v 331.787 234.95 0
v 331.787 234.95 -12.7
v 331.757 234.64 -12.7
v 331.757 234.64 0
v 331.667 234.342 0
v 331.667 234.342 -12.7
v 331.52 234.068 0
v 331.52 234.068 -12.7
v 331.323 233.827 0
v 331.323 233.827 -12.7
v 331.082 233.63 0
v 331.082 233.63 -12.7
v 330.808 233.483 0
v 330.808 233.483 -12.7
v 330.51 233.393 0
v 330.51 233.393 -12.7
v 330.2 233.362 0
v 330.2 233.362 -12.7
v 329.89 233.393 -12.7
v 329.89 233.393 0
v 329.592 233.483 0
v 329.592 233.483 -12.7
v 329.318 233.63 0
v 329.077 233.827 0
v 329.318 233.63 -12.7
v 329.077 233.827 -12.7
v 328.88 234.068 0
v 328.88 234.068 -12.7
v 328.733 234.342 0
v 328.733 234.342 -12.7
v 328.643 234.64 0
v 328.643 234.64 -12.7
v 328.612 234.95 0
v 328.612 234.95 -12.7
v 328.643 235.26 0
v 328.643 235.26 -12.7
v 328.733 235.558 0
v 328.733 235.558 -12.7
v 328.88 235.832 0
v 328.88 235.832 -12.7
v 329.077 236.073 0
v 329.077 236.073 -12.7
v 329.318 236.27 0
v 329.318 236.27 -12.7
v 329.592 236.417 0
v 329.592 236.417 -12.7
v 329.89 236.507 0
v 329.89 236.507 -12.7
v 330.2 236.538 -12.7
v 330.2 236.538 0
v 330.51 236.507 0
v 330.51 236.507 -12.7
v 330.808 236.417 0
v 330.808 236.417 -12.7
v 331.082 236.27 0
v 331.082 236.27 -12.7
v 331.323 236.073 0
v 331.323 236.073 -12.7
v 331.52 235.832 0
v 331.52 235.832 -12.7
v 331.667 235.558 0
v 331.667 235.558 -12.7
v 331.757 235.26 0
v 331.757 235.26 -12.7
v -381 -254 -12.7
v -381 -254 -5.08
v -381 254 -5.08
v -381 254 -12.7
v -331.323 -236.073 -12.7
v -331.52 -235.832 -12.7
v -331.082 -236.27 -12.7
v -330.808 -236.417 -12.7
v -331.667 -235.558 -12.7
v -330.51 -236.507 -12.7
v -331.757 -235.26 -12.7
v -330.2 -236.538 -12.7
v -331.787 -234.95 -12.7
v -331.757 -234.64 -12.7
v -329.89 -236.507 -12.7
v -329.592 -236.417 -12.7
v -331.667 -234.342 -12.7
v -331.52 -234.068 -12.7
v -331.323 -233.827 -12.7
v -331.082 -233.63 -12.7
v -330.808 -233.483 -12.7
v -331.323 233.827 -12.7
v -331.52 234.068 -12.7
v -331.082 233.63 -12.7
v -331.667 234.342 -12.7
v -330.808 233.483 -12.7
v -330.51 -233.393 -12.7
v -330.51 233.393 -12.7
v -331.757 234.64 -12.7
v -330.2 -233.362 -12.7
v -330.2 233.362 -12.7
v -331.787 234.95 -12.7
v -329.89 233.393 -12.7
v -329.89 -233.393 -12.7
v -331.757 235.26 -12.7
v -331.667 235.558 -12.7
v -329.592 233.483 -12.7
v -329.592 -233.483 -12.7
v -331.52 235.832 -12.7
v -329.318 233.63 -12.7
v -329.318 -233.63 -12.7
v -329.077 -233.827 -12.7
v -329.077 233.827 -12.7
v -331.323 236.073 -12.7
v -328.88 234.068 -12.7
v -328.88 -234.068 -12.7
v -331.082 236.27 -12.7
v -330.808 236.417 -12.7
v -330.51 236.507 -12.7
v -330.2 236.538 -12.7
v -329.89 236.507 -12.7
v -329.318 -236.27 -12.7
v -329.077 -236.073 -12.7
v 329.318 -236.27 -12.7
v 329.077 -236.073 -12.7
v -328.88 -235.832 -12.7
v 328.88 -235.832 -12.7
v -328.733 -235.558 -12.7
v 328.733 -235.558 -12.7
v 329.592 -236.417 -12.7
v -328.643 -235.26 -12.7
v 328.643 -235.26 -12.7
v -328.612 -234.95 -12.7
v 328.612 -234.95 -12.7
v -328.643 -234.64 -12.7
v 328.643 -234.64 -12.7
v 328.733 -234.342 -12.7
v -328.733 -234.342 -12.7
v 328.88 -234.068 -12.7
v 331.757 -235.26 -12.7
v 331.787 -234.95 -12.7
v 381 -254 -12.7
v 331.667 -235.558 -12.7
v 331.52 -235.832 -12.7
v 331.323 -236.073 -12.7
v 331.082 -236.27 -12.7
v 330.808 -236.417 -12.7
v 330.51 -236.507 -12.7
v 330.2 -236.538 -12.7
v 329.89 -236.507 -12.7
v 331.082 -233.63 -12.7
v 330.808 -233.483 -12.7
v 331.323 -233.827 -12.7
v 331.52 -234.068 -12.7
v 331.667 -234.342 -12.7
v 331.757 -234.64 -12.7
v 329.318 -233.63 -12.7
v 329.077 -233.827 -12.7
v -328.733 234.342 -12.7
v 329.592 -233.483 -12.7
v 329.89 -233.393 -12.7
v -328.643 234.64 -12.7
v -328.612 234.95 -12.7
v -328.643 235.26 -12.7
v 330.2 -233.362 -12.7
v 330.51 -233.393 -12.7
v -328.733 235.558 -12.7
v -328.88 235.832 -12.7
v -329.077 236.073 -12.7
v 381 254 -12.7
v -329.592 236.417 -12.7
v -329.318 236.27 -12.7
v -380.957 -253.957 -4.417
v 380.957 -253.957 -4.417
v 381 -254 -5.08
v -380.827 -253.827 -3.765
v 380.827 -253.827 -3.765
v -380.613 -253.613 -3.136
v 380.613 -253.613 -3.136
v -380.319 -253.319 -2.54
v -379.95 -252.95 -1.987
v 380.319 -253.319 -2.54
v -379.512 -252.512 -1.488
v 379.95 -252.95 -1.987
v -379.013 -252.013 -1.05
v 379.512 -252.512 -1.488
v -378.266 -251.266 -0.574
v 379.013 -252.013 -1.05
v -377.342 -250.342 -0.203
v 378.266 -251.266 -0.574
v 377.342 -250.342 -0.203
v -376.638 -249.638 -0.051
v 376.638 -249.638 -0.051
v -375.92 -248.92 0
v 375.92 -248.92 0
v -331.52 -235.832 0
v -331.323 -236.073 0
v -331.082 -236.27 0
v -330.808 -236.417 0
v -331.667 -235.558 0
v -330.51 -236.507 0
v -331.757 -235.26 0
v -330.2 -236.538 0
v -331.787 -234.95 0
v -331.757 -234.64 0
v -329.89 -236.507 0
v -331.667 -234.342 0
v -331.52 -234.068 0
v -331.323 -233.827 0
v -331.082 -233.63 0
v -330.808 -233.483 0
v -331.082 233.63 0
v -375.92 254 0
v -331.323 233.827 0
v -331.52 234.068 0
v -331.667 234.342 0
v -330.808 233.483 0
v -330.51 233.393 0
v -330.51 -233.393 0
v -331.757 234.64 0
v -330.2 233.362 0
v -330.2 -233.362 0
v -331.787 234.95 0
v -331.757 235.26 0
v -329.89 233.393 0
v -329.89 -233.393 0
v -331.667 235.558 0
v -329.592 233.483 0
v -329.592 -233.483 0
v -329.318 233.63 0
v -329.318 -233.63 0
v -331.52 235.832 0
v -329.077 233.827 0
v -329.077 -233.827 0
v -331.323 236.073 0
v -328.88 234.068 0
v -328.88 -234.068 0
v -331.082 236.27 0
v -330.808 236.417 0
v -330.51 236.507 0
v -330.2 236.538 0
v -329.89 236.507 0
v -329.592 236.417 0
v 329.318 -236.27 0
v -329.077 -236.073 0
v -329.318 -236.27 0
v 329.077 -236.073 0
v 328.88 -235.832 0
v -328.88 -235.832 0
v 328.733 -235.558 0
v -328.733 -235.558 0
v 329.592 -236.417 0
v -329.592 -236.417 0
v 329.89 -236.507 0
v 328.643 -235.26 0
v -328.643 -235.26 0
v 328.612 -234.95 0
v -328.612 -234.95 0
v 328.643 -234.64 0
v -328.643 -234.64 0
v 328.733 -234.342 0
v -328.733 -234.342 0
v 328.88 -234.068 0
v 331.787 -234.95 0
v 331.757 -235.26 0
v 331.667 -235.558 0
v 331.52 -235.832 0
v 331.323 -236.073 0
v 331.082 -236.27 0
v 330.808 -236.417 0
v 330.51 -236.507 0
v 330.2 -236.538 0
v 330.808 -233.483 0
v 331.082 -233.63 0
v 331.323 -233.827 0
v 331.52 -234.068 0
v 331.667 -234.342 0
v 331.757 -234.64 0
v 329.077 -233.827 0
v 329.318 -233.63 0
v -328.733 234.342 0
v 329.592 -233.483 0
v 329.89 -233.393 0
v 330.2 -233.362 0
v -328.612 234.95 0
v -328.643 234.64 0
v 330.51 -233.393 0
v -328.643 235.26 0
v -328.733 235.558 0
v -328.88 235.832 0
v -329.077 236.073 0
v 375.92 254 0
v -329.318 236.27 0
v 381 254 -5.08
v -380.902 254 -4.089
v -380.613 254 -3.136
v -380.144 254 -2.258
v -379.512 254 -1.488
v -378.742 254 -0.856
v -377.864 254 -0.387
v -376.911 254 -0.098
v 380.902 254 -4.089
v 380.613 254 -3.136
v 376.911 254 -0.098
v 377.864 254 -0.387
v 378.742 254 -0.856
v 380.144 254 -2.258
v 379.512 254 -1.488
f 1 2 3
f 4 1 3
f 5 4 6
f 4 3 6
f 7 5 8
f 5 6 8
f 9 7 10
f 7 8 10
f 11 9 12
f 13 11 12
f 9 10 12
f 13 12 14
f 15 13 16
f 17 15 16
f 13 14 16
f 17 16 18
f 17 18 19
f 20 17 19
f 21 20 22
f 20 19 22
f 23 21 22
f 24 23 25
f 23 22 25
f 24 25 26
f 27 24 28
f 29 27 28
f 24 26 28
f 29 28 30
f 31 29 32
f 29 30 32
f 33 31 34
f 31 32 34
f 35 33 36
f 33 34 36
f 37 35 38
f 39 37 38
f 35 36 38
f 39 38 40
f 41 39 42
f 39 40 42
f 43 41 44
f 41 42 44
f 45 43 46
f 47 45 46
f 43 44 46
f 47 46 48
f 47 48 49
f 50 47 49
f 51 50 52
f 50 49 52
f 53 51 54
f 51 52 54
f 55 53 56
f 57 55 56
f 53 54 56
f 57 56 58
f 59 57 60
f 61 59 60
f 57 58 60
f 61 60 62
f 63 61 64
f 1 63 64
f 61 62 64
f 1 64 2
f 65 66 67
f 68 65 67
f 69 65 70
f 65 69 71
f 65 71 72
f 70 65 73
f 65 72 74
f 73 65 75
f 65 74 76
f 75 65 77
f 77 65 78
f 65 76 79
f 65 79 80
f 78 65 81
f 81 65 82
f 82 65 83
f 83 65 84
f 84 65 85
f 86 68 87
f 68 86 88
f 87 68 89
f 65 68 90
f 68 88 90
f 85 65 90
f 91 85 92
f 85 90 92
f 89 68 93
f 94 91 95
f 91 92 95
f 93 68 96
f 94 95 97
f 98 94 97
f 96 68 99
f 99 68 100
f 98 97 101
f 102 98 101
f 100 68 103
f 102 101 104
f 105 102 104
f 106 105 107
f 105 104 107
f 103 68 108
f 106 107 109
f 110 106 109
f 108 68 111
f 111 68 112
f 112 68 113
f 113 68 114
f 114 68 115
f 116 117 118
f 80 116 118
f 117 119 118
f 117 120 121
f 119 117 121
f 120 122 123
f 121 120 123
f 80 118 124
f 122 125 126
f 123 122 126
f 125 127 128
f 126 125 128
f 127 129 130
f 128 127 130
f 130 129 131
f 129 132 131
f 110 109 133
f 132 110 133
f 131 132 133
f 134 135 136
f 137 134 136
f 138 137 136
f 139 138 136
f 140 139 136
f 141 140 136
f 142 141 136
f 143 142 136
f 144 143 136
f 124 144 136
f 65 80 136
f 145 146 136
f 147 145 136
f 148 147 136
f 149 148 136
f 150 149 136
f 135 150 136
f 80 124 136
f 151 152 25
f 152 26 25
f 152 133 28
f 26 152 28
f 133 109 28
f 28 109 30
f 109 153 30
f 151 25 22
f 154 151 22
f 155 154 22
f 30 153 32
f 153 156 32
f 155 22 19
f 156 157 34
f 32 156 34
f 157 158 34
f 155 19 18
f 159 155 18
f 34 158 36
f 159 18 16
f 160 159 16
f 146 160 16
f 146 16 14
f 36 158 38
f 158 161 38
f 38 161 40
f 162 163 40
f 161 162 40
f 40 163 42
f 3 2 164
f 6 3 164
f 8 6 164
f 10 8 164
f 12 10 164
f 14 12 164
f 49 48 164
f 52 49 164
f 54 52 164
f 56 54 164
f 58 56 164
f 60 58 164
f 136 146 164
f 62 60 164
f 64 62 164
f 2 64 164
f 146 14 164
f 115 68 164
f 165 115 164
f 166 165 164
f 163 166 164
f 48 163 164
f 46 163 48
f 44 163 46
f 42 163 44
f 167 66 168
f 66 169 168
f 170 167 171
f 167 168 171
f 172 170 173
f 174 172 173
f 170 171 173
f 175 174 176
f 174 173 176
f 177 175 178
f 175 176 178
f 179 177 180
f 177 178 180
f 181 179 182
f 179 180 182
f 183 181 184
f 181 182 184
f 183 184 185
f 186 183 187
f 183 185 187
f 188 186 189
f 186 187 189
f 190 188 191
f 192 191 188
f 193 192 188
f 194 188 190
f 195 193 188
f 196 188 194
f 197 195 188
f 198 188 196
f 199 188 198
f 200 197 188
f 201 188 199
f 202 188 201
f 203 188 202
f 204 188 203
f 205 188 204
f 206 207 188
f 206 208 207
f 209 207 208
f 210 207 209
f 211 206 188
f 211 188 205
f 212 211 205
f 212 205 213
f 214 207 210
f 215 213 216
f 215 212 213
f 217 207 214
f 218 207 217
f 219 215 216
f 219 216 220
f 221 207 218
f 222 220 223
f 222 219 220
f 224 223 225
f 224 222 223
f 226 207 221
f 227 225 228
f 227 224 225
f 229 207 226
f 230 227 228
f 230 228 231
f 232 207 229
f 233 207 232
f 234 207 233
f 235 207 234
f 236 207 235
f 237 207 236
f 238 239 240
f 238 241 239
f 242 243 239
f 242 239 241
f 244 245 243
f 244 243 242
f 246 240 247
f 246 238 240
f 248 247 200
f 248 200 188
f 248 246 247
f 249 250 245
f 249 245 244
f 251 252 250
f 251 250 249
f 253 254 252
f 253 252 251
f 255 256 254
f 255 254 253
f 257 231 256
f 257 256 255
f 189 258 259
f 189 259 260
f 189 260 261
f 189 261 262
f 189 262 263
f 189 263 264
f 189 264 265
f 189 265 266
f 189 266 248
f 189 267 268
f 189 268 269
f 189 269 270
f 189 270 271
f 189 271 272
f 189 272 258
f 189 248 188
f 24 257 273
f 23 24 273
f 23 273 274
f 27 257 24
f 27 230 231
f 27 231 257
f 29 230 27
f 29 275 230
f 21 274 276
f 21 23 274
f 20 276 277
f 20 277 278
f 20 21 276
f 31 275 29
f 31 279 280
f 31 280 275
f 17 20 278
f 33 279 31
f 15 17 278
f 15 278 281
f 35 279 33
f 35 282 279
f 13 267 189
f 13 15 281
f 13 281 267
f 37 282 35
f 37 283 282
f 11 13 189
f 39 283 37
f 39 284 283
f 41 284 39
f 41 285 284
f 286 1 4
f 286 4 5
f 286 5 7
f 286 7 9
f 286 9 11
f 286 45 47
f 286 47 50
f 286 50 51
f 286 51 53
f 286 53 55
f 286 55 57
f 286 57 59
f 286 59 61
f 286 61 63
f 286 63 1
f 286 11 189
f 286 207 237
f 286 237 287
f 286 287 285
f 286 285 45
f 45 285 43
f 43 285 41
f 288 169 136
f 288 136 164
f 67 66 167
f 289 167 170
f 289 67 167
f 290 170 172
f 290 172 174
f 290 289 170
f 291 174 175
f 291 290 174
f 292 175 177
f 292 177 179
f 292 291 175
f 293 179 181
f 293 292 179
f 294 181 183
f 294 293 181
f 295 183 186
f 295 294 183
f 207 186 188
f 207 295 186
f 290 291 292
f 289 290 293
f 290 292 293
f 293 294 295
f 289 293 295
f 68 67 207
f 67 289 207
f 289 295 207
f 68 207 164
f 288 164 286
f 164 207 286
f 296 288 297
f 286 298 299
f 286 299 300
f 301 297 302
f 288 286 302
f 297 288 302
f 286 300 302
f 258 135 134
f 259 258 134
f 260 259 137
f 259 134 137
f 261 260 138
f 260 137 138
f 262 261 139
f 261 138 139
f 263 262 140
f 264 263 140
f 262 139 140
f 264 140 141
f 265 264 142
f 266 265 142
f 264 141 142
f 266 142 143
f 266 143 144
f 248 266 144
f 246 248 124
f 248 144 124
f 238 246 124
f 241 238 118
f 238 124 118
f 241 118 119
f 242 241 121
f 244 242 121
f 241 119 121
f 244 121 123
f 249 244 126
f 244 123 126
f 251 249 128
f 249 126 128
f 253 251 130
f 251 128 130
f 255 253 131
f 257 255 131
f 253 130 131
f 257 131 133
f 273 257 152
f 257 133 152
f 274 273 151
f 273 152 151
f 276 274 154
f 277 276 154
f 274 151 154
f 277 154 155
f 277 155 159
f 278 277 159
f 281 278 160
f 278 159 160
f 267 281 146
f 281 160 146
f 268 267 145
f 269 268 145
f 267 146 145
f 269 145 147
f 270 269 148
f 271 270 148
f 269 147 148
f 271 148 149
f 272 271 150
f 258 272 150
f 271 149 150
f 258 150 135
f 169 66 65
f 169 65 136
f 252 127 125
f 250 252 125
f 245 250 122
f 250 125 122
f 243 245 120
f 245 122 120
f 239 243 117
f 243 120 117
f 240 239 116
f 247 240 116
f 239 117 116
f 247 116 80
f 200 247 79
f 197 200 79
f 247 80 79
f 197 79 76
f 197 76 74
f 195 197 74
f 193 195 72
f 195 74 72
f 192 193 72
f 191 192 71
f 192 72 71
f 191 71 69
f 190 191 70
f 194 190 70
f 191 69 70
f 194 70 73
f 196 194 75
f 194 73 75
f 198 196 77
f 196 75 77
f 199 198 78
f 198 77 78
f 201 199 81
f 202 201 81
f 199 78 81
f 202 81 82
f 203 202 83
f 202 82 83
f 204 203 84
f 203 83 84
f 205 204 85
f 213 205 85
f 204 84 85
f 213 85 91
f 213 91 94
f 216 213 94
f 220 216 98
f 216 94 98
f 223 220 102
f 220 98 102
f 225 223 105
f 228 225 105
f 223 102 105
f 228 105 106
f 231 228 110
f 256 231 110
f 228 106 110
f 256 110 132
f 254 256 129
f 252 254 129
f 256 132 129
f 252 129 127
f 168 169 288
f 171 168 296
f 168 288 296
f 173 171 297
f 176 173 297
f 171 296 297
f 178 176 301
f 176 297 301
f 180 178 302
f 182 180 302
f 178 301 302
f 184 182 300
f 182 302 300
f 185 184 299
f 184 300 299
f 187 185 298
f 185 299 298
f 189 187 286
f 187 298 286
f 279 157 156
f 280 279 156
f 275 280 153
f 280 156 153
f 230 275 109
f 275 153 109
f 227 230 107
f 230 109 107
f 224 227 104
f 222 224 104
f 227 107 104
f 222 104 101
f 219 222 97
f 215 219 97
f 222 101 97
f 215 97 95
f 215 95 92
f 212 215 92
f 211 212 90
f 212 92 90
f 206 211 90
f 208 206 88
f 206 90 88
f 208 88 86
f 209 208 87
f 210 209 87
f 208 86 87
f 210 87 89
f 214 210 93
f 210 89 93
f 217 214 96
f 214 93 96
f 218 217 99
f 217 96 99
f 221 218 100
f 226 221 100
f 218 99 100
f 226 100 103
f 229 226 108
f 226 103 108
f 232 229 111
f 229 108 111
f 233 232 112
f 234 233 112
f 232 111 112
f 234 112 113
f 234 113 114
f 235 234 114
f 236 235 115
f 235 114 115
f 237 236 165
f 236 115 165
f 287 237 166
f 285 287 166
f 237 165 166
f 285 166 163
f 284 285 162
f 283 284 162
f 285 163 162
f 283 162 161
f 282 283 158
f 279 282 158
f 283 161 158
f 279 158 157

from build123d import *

# Parameters (mm, degrees)
F0_W      = 762
F0_H      = 508
F1_DEPTH  = 12.7
F2_R      = 5.08
F3_R      = 1.5875
F4_DEPTH  = 12.7
F5_R      = 1.5875
F6_DEPTH  = 12.7
F7_R      = 1.5875
F8_DEPTH  = 12.7
F9_R      = 1.5875
F10_DEPTH = 12.7


with BuildPart() as f1:
    # F0 (on Top) → F1 (new body)
    with BuildSketch(Plane.XY):
        Rectangle(F0_W, F0_H)
    extrude(amount=-F1_DEPTH)

    # F2
    f2_edges = [f1.edges().sort_by_distance(p)[0] for p in [
        (0, -254, 0),
        (381, 0, 0),
        (-381, 0, 0),
    ]]
    fillet(f2_edges, radius=F2_R)

    # F3 (on face) → F4 (cut, through all)
    with BuildSketch(Plane(origin=(0, 0, -12.7), x_dir=(1, 0, 0), z_dir=(0, 0, -1))):
        with Locations((330.2, 234.95)):
            Circle(F3_R)
    extrude(amount=-F4_DEPTH, mode=Mode.SUBTRACT)

    # F5 (on face) → F6 (cut, through all)
    with BuildSketch(Plane(origin=(0, 0, -12.7), x_dir=(1, 0, 0), z_dir=(0, 0, -1))):
        with Locations((-330.2, 234.95)):
            Circle(F5_R)
    extrude(amount=-F6_DEPTH, mode=Mode.SUBTRACT)

    # F7 (on face) → F8 (cut, through all)
    with BuildSketch(Plane(origin=(0, 0, -12.7), x_dir=(1, 0, 0), z_dir=(0, 0, -1))):
        with Locations((330.2, -234.95)):
            Circle(F7_R)
    extrude(amount=-F8_DEPTH, mode=Mode.SUBTRACT)

    # F9 (on face) → F10 (cut, through all)
    with BuildSketch(Plane(origin=(0, 0, -12.7), x_dir=(1, 0, 0), z_dir=(0, 0, -1))):
        with Locations((-330.2, -234.95)):
            Circle(F9_R)
    extrude(amount=-F10_DEPTH, mode=Mode.SUBTRACT)


solid = f1.part
